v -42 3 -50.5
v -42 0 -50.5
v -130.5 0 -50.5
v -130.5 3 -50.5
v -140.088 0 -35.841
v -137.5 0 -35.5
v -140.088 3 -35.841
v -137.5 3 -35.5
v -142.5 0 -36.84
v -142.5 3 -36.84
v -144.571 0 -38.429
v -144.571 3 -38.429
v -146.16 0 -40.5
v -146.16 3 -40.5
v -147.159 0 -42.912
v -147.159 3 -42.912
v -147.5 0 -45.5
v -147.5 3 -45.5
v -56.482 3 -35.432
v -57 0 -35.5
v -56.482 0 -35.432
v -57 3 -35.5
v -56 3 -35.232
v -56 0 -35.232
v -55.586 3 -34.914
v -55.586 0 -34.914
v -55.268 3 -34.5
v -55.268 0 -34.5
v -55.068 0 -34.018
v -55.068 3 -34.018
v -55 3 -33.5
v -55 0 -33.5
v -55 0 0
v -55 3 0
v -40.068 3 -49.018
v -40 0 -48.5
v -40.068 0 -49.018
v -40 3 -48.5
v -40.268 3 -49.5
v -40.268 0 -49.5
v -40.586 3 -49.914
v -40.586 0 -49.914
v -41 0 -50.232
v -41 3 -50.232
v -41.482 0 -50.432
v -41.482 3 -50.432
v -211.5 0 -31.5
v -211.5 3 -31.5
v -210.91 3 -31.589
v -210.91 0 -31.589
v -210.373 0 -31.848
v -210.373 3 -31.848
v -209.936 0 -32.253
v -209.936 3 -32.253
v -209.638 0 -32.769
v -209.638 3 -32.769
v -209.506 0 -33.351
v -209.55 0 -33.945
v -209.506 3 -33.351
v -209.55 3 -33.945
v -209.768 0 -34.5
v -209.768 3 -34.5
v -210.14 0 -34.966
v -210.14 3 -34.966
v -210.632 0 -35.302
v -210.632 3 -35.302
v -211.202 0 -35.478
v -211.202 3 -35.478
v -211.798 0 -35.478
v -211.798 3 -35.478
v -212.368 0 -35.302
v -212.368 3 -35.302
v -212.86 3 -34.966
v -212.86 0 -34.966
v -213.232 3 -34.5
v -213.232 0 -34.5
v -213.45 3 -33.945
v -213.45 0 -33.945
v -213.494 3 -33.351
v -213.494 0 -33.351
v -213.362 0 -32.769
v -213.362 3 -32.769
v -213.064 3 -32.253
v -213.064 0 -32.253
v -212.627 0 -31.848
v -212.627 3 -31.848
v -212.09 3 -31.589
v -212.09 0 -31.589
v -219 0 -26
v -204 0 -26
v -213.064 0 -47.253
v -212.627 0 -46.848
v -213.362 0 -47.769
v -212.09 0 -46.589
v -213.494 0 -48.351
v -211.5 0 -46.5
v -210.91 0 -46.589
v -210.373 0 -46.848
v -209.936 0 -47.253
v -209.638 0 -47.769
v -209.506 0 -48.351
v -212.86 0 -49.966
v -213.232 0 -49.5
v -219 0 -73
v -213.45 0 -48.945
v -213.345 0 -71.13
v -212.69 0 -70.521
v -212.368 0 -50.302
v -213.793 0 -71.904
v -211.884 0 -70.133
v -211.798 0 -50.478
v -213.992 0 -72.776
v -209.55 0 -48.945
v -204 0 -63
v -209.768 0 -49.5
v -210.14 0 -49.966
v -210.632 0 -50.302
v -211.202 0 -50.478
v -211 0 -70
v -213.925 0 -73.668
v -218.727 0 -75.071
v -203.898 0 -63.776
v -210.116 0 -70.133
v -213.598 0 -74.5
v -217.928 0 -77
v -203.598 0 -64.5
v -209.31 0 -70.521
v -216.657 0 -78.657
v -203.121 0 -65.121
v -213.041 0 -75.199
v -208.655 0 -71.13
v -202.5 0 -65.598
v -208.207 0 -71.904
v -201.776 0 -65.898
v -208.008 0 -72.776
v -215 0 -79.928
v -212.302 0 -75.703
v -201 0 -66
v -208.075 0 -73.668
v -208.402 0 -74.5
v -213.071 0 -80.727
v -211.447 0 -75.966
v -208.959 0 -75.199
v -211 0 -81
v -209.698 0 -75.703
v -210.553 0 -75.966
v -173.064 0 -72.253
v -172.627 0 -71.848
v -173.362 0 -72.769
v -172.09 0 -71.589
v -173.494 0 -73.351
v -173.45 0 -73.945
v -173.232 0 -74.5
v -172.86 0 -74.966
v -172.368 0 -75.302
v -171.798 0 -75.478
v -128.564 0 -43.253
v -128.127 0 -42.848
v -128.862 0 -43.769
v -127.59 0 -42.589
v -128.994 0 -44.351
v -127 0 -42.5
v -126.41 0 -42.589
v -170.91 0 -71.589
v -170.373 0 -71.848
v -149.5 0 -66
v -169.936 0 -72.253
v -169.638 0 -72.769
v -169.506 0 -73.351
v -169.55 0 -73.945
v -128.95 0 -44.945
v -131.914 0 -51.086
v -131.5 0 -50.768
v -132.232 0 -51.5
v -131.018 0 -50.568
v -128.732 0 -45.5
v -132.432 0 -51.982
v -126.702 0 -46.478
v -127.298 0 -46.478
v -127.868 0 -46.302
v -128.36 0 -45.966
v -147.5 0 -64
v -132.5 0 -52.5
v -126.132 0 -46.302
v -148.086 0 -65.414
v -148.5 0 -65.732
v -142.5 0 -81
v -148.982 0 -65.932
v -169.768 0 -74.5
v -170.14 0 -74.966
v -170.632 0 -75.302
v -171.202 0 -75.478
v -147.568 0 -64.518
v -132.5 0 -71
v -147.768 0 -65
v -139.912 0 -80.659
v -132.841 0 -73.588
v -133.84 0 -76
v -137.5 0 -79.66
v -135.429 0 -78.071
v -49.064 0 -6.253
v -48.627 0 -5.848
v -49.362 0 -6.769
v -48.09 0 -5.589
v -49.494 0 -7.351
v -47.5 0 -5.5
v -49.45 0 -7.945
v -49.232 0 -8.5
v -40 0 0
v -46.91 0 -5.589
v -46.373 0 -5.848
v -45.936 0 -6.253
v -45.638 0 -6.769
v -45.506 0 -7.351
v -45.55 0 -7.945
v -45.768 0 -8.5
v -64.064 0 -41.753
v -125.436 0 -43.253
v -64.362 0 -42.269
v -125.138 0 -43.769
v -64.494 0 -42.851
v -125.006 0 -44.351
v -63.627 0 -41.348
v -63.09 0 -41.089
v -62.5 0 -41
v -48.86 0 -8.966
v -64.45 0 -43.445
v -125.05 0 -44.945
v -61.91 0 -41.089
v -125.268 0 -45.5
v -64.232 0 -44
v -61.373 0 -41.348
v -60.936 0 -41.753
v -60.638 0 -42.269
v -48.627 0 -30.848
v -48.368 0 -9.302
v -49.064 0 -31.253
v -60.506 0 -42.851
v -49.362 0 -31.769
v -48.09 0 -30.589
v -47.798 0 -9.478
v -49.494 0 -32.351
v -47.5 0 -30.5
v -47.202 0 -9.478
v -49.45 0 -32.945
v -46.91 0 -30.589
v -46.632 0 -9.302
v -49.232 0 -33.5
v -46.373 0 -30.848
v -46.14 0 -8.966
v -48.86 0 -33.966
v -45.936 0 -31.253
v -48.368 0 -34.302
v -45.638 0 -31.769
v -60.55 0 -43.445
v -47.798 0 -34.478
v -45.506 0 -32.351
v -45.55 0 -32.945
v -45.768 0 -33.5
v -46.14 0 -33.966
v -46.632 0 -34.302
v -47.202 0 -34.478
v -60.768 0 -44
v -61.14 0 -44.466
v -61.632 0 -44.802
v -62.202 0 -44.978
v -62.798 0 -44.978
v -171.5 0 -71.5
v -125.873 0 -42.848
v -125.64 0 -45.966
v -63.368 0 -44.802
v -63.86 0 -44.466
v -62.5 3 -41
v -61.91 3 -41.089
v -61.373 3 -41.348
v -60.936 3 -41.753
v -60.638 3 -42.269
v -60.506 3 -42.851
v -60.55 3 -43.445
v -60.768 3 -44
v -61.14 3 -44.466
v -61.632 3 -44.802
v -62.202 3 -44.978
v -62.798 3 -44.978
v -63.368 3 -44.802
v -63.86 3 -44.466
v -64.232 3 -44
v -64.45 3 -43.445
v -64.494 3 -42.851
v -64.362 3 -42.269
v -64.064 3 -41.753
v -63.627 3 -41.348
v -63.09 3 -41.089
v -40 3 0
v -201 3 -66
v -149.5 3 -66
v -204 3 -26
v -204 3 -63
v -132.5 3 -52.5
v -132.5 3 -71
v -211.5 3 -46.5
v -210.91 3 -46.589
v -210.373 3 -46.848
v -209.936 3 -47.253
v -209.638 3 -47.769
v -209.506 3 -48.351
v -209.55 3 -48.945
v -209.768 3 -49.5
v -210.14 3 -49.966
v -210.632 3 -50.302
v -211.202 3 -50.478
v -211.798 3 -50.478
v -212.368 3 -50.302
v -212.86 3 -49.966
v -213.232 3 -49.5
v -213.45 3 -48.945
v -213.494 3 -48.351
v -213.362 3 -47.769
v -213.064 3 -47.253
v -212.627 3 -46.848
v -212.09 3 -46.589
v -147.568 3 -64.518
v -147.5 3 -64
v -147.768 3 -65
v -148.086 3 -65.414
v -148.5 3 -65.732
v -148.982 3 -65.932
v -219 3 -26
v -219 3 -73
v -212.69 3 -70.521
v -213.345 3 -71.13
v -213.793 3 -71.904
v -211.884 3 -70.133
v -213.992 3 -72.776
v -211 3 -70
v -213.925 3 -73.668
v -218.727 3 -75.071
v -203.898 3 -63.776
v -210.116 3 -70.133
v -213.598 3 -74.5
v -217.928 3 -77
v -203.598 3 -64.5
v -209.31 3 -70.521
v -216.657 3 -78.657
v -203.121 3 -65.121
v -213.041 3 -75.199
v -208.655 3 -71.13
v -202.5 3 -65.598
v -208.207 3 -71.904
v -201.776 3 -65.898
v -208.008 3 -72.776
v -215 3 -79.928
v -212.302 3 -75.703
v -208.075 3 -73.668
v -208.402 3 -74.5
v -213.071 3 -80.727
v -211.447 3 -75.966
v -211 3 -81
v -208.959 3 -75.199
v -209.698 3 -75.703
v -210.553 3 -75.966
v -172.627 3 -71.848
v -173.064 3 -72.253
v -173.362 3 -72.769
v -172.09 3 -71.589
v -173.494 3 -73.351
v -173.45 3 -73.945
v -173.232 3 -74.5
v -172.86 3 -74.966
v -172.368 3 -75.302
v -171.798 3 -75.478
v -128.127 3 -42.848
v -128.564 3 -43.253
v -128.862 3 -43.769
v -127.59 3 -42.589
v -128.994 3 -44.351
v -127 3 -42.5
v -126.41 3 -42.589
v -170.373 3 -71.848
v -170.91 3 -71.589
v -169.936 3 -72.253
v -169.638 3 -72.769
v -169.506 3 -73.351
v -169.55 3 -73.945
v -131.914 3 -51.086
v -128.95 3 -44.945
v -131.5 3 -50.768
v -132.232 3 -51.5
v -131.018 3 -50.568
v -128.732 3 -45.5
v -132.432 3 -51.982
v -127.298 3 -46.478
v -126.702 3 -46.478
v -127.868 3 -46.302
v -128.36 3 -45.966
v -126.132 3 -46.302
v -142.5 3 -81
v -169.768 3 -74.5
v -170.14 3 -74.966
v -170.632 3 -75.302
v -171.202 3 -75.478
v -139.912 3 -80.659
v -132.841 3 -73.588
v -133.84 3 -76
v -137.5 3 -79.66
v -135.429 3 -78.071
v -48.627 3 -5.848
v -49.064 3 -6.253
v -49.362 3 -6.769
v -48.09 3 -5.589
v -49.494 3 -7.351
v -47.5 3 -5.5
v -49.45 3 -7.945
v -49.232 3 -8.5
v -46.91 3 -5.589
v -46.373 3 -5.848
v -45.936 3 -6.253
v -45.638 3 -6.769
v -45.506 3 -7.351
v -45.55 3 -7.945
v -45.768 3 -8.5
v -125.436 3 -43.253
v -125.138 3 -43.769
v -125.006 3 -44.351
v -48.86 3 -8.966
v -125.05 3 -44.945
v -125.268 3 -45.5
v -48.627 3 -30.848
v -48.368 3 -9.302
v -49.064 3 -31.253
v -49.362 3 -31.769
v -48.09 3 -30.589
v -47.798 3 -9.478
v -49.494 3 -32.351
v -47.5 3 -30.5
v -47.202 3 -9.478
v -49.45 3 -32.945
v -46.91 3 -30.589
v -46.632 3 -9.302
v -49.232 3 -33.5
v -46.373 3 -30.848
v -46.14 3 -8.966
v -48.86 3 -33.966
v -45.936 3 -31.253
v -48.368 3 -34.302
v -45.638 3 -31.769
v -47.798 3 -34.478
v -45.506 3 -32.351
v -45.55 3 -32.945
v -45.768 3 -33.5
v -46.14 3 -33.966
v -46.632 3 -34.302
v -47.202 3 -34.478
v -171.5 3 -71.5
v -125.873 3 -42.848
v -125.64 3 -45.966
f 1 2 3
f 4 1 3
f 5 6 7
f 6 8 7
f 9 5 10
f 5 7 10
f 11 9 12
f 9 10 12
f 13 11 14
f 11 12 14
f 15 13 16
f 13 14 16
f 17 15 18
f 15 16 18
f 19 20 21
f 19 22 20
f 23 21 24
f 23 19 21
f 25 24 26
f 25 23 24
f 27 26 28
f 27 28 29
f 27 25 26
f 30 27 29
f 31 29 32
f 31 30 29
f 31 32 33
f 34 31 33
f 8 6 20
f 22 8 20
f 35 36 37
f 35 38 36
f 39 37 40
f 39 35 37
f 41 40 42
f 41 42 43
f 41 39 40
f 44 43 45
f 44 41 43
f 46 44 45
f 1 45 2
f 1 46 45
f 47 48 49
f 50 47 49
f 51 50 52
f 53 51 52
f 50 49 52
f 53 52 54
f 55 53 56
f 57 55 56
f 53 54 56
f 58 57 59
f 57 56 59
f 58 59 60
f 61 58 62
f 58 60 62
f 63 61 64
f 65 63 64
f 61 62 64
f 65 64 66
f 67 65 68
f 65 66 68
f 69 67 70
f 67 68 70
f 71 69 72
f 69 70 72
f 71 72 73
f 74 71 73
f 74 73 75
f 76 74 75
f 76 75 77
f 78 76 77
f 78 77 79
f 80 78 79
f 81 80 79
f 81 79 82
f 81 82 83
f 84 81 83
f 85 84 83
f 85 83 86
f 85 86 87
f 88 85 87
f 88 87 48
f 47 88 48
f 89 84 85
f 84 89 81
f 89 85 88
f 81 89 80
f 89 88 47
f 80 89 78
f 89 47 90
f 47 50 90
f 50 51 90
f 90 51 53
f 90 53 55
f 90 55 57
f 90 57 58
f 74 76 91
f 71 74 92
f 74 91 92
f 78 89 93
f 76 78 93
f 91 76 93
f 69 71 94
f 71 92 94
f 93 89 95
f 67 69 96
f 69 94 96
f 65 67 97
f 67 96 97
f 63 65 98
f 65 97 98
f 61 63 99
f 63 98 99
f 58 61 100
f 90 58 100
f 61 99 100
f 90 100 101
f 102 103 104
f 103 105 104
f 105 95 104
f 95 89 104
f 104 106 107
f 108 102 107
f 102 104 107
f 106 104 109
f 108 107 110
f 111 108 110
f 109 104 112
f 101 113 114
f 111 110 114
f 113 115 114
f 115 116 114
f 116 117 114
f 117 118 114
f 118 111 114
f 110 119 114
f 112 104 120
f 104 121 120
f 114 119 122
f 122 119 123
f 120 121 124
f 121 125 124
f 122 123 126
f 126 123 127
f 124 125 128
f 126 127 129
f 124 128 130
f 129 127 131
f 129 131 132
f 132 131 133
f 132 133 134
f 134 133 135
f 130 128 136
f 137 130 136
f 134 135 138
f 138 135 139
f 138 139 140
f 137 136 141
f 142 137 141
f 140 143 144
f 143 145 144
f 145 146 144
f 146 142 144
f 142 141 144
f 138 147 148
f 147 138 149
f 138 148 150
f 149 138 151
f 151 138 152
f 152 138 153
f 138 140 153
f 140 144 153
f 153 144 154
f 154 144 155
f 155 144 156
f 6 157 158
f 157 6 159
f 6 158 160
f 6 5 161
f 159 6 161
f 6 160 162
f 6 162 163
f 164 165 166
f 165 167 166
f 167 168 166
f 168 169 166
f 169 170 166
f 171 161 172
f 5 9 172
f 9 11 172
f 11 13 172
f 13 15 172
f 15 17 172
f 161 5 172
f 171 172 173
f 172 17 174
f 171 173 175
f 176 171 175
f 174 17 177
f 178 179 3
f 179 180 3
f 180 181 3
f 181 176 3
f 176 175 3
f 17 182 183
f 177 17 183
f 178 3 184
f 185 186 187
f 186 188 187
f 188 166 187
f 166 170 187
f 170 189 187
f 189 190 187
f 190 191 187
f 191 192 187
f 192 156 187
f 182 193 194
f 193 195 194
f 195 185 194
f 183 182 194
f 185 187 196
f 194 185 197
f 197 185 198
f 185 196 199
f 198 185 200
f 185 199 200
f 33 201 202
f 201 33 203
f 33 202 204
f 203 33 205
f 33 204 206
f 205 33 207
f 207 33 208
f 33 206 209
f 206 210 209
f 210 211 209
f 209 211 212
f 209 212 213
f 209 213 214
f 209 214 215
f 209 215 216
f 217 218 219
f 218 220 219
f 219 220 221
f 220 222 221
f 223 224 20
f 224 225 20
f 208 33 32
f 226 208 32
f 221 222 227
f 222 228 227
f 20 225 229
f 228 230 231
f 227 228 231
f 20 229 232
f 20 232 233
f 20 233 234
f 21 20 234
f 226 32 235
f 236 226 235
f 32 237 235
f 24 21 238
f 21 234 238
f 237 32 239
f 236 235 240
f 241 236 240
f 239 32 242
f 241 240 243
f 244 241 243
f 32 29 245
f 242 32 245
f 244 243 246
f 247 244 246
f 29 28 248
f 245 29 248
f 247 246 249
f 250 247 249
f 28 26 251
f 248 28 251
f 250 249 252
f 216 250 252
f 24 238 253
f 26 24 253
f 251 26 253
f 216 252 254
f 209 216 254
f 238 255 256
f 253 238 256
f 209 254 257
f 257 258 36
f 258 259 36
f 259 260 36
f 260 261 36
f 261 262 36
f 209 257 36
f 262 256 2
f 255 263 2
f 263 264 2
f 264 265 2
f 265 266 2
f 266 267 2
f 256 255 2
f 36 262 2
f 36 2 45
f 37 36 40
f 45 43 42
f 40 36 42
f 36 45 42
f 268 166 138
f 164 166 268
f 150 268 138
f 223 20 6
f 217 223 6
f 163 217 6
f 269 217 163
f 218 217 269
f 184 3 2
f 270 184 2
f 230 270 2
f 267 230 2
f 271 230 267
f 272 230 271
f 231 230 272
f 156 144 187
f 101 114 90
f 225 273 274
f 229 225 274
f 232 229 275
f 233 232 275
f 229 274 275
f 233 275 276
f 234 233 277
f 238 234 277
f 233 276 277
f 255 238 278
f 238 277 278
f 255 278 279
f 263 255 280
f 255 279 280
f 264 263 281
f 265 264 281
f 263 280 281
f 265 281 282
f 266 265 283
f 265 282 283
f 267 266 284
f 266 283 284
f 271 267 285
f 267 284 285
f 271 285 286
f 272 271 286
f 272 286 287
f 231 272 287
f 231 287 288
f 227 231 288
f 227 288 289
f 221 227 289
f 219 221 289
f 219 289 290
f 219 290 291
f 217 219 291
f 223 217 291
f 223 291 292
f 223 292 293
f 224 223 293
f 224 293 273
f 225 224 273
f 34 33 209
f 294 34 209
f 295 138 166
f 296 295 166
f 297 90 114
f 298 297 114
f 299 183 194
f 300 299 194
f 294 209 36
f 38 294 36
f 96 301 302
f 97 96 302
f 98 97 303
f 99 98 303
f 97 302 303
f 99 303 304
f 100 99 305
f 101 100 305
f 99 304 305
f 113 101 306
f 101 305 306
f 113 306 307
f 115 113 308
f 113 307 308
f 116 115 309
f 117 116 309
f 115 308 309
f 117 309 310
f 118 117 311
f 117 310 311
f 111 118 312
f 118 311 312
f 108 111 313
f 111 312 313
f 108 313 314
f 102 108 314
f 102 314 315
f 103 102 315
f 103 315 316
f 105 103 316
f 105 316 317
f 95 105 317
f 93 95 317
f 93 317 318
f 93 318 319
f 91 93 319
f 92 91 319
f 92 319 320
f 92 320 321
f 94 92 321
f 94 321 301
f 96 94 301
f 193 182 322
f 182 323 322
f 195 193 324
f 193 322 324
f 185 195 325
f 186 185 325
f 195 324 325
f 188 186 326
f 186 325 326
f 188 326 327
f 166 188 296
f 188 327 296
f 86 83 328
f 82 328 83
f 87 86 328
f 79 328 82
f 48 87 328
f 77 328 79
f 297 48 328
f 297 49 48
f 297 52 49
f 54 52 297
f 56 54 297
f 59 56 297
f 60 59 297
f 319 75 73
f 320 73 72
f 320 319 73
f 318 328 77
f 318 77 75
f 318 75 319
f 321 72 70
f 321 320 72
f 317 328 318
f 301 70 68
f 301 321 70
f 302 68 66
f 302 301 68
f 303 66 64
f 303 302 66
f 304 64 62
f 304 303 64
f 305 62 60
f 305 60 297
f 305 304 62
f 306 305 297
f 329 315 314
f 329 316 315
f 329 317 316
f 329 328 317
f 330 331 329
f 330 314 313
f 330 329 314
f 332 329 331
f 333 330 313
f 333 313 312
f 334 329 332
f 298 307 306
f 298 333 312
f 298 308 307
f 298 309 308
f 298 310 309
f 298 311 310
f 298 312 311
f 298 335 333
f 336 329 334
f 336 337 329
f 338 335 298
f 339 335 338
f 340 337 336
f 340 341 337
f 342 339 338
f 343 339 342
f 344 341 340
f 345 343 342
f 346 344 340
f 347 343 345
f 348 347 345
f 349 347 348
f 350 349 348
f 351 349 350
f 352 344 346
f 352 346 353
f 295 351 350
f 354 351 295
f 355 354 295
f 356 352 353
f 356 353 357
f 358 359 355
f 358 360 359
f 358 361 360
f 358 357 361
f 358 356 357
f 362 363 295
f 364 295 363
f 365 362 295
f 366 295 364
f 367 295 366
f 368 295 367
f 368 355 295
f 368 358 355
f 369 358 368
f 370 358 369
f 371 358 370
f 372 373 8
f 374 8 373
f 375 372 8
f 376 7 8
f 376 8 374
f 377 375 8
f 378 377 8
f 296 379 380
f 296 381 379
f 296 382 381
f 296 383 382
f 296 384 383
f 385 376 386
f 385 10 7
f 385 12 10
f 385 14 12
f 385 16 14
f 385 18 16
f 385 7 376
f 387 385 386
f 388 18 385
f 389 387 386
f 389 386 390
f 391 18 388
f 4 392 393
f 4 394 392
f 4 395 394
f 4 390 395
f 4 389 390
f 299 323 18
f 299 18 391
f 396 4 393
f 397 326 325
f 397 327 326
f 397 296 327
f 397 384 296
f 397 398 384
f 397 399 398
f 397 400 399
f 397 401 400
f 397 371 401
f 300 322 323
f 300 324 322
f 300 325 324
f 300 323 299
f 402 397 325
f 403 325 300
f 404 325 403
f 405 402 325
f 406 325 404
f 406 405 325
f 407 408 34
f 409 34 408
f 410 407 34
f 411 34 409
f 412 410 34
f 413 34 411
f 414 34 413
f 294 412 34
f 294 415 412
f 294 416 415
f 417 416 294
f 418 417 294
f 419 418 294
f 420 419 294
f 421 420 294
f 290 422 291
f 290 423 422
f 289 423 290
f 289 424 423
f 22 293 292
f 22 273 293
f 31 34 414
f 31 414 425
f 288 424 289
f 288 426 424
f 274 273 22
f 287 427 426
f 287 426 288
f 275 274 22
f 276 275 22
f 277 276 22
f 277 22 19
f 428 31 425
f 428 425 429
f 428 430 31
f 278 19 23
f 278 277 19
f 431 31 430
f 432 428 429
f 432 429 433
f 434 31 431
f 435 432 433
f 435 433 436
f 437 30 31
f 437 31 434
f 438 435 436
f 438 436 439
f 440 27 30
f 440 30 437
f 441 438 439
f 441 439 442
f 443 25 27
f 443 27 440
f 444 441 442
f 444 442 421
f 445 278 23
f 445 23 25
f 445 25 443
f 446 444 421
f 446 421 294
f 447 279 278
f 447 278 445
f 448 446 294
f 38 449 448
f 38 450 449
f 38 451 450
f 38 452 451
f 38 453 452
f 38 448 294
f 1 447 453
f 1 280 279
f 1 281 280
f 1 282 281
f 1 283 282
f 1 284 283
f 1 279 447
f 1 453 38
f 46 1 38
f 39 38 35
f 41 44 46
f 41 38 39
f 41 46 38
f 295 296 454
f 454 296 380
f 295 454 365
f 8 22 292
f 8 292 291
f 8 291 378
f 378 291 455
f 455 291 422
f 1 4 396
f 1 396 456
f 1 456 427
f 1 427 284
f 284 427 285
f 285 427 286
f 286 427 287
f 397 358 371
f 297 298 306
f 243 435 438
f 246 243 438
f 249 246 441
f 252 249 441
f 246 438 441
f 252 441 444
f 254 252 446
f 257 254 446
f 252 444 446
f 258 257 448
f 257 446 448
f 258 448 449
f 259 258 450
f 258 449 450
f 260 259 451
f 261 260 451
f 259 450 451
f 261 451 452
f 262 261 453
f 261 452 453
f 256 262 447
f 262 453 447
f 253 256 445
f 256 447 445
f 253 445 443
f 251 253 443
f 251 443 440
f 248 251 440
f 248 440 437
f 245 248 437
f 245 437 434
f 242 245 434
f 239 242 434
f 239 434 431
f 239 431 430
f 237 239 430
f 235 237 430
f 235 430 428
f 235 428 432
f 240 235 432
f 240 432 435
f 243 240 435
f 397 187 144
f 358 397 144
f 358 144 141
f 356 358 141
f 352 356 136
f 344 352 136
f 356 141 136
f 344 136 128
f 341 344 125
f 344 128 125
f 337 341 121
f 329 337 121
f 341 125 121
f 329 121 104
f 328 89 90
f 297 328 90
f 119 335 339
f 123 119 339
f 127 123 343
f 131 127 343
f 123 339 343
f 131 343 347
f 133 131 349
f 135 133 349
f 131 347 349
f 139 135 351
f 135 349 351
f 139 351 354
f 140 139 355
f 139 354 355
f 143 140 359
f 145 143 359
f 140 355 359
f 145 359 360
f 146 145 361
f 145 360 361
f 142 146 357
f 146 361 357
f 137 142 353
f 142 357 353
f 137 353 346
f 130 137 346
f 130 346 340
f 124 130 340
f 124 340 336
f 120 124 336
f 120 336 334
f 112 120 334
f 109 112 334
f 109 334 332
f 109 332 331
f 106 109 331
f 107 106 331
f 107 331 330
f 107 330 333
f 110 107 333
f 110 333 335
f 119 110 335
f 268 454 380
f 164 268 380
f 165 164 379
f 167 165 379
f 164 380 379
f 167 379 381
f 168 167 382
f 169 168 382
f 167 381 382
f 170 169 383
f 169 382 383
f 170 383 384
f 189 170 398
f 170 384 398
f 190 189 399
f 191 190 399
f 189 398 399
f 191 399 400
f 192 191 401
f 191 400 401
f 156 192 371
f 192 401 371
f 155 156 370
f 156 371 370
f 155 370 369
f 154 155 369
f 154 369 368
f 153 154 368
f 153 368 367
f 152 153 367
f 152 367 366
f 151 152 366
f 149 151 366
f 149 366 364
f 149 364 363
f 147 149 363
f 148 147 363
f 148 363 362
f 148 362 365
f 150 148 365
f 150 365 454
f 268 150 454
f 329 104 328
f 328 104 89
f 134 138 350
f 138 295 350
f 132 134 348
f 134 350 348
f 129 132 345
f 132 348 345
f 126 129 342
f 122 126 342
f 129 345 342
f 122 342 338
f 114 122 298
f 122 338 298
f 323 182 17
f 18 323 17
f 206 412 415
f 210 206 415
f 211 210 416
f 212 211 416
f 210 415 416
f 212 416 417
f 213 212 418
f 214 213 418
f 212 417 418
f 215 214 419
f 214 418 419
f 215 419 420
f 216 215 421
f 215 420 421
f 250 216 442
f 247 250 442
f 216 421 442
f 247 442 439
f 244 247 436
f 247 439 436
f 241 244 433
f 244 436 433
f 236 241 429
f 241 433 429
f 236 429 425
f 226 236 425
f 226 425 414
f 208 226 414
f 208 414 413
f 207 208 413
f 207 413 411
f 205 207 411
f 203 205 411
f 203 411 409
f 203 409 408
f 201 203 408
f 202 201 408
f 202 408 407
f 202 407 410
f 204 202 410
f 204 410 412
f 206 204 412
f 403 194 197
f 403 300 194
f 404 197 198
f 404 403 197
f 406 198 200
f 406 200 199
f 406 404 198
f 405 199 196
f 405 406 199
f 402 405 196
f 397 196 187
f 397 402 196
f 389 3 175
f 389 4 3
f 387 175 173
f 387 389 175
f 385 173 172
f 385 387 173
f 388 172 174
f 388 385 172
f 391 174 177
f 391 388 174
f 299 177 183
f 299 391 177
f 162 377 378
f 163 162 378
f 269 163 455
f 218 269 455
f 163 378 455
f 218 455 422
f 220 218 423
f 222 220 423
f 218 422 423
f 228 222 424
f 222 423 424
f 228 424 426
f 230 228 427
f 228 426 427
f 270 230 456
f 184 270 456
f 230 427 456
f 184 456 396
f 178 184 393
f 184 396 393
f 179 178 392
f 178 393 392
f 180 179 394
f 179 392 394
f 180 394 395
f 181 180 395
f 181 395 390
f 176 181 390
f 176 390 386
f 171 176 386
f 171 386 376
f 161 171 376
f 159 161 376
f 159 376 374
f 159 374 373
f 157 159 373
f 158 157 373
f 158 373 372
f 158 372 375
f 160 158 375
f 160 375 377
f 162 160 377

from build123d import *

# Parameters (mm, degrees)
EXTRUDE_1_DEPTH     = 3
SKETCH_2_R          = 2
SKETCH_2_R_2        = 3
CUT_EXTRUDE_1_DEPTH = 10
FILLET_1_R          = 10
FILLET_2_R          = 2
FILLET_3_R          = 3


with BuildPart() as part:
    # 草图1 → 凸台-拉伸1 (new body)
    with BuildSketch(Plane(origin=(0, 0, 0), x_dir=(1, 0, 0), z_dir=(0, 1, 0))):
        with BuildLine():
            Line((-55, 0), (-40, 0))
            Line((-40, 0), (-40, 50.5))
            Line((-40, 50.5), (-132.5, 50.5))
            Line((-132.5, 50.5), (-132.5, 81))
            Line((-132.5, 81), (-211, 81))
            ThreePointArc((-211, 81), (-216.656854249, 78.656854249), (-219, 73))
            Line((-219, 73), (-219, 26))
            Line((-219, 26), (-204, 26))
            Line((-204, 26), (-204, 66))
            Line((-204, 66), (-147.5, 66))
            Line((-147.5, 66), (-147.5, 35.5))
            Line((-147.5, 35.5), (-55, 35.5))
            Line((-55, 35.5), (-55, 0))
        make_face()
    extrude(amount=EXTRUDE_1_DEPTH)

    # 草图2 → 切除-拉伸1 (cut)
    with BuildSketch(Plane(origin=(0, 3, 0), x_dir=(1, 0, 0), z_dir=(0, 1, 0))):
        with Locations(Location((-47.5, 32.5, 0), (0, 0, 270))):
            Circle(SKETCH_2_R)
        with Locations(Location((-211.5, 33.5, 0), (0, 0, 270))):
            Circle(SKETCH_2_R)
        with Locations(Location((-211.5, 48.5, 0), (0, 0, 270))):
            Circle(SKETCH_2_R)
        with Locations(Location((-211, 73, 0), (0, 0, 270))):
            Circle(SKETCH_2_R_2)
        with Locations(Location((-171.5, 73.5, 0), (0, 0, 270))):
            Circle(SKETCH_2_R)
        with Locations(Location((-127, 44.5, 0), (0, 0, 270))):
            Circle(SKETCH_2_R)
        with Locations(Location((-62.5, 43, 0), (0, 0, 270))):
            Circle(SKETCH_2_R)
        with Locations(Location((-47.5, 7.5, 0), (0, 0, 270))):
            Circle(SKETCH_2_R)
    extrude(amount=-CUT_EXTRUDE_1_DEPTH, mode=Mode.SUBTRACT)

    # 圆角1
    fillet_1_edges = [part.edges().sort_by_distance(p)[0] for p in [
        (-147.5, 1.5, -35.5),
        (-132.5, 1.5, -81),
    ]]
    fillet(fillet_1_edges, radius=FILLET_1_R)

    # 圆角2
    fillet_2_edges = [part.edges().sort_by_distance(p)[0] for p in [
        (-40, 1.5, -50.5),
        (-55, 1.5, -35.5),
        (-147.5, 1.5, -66),
        (-132.5, 1.5, -50.5),
    ]]
    fillet(fillet_2_edges, radius=FILLET_2_R)

    # 圆角3
    fillet_3_edges = [part.edges().sort_by_distance(p)[0] for p in [
        (-204, 1.5, -66),
    ]]
    fillet(fillet_3_edges, radius=FILLET_3_R)


solid = part.part
